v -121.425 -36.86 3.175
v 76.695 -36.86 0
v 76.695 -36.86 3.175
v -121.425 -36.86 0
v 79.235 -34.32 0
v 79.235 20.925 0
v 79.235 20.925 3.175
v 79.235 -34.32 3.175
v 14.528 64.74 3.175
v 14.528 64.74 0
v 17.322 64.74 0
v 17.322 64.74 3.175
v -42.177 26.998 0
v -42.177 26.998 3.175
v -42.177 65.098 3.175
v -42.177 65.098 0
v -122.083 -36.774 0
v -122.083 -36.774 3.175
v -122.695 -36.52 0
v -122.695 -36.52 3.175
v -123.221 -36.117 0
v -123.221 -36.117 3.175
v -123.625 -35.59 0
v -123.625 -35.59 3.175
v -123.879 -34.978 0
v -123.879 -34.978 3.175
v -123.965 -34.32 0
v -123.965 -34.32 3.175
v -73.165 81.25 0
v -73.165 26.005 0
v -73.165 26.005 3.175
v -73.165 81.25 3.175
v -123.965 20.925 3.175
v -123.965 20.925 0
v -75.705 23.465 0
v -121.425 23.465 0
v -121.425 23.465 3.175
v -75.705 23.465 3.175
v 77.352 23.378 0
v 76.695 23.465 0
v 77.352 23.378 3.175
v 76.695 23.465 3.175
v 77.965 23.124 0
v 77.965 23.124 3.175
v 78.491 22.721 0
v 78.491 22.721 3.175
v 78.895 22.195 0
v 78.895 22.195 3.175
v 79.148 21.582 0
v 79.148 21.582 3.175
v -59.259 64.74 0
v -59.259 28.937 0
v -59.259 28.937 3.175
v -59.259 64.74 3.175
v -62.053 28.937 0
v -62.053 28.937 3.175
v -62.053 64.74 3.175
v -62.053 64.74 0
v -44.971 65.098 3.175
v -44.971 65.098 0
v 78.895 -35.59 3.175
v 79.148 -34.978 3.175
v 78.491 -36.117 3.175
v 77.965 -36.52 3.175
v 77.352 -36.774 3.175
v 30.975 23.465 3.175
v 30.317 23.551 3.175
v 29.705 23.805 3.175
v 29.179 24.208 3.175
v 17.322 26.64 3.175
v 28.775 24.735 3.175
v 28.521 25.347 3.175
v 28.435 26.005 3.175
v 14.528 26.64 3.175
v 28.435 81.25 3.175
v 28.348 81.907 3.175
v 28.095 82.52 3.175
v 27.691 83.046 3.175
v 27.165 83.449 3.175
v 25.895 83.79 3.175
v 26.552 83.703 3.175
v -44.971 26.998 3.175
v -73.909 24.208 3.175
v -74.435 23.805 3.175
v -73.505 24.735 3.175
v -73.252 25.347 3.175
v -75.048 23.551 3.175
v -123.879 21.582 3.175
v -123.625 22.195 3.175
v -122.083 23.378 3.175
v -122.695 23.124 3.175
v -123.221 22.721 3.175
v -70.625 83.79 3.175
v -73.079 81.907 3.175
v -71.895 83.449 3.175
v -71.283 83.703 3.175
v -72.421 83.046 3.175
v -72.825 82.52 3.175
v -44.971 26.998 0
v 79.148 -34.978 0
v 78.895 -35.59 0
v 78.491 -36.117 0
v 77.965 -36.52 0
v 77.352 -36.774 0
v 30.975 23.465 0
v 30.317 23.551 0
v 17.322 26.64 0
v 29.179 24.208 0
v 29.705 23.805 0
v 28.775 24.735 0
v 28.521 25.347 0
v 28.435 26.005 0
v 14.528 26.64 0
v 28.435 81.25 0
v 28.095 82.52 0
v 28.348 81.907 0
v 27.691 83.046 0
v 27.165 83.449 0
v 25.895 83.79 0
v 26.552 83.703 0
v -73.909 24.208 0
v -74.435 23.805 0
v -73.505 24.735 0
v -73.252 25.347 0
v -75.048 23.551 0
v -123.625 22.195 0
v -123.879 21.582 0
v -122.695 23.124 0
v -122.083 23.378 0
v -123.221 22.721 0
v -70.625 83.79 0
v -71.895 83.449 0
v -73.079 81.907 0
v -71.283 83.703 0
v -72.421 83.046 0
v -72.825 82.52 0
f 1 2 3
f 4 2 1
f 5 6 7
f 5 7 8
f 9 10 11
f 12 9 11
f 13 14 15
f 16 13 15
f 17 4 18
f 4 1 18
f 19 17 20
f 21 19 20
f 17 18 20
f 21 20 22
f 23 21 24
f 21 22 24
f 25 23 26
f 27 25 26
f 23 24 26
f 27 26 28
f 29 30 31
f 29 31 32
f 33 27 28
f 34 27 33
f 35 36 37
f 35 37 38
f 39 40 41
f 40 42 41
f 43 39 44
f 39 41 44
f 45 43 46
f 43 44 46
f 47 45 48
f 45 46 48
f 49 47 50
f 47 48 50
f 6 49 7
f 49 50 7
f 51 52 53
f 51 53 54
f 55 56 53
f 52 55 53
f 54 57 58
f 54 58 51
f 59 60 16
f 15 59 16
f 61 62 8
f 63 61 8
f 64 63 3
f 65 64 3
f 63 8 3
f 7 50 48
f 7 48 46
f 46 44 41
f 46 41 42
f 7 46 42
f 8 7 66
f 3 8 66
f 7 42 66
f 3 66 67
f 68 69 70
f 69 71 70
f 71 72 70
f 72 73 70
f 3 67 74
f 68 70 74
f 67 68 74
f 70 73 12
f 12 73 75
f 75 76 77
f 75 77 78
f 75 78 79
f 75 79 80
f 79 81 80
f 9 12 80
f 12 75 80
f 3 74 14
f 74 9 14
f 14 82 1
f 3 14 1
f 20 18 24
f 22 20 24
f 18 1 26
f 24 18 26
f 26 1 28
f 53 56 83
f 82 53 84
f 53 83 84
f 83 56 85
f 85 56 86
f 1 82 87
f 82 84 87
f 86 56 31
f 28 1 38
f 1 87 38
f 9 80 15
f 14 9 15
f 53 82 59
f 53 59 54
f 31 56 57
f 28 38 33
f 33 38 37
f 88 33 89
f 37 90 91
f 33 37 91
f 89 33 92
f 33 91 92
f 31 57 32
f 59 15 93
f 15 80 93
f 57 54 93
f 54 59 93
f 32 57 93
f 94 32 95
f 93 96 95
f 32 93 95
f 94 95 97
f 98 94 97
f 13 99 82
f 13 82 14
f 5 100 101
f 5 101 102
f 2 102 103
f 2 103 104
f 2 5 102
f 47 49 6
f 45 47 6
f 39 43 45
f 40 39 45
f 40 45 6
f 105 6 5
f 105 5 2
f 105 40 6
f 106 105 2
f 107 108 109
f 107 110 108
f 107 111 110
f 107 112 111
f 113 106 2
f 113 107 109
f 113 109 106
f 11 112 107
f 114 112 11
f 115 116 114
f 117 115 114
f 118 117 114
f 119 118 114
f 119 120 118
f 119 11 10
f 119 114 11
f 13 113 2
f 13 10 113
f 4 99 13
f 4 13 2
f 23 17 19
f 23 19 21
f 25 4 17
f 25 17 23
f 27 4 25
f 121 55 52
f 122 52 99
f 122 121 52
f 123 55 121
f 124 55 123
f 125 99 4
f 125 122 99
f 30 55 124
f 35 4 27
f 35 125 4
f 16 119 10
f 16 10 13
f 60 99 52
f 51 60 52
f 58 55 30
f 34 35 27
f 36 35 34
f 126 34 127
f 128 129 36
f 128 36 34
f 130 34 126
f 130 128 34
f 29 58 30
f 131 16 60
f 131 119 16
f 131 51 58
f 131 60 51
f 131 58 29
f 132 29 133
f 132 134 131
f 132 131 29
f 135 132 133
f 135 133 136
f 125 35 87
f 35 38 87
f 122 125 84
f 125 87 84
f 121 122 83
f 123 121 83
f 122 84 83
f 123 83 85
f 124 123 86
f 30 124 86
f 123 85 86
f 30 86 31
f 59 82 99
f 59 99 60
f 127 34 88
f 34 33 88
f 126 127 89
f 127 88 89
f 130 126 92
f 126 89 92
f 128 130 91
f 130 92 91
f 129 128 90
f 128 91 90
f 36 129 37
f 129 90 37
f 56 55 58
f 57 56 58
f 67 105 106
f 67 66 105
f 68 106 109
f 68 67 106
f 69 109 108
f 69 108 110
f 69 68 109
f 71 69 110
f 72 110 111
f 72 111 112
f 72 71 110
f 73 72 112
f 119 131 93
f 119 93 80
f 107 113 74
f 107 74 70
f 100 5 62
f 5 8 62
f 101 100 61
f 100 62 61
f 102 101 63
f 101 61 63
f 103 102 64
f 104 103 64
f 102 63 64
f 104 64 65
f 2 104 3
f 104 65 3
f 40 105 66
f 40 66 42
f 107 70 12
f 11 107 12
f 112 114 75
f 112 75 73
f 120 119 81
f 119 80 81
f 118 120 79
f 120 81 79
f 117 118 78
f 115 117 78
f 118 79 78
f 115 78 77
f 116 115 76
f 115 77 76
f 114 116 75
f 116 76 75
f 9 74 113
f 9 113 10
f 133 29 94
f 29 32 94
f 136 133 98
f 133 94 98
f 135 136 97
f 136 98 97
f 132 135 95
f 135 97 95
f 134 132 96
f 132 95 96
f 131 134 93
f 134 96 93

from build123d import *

# Parameters (mm, degrees)
BOSS_EXTRUDE1_DEPTH    = 3.175
FILLET1_R              = 2.54
SKETCH2_W              = 2.794
SKETCH2_H              = 38.1
CUT_EXTRUDE1_DEPTH     = 3.175
CUT_EXTRUDE2_START     = -3.175
CUT_EXTRUDE2_OUTLINE_W = 2.794
CUT_EXTRUDE2_OUTLINE_H = 35.802572731
CUT_EXTRUDE2_DEPTH     = 3.175
SKETCH4_W              = 2.794
SKETCH4_H              = 38.1
CUT_EXTRUDE3_DEPTH     = 3.175


# Read off the part's stored shape, not the designer's step: Cut-Extrude2
with BuildPart() as part:
    # Sketch1 → Boss-Extrude1 (new body)
    with BuildSketch(Plane.XY):
        Polygon((28.434847271, 23.464502165), (79.234847271, 23.464502165), (79.234847271, -36.860497835), (-123.965152729, -36.860497835), (-123.965152729, 23.464502165), (-73.165152729, 23.464502165), (-73.165152729, 83.789502165), (28.434847271, 83.789502165), align=None)
    extrude(amount=BOSS_EXTRUDE1_DEPTH)

    # Fillet1
    fillet1_edges = [part.edges().sort_by_distance(p)[0] for p in [
        (-123.965152729, 23.464502165, 1.5875),
        (-73.165152729, 23.464502165, 1.5875),
        (-73.165152729, 83.789502165, 1.5875),
        (28.434847271, 83.789502165, 1.5875),
        (28.434847271, 23.464502165, 1.5875),
        (79.234847271, 23.464502165, 1.5875),
        (79.234847271, -36.860497835, 1.5875),
        (-123.965152729, -36.860497835, 1.5875),
    ]]
    fillet(fillet1_edges, radius=FILLET1_R)

    # Sketch2 → Cut-Extrude1 (cut)
    with BuildSketch(Plane.XY.offset(3.175)):
        with Locations((15.925347271, 45.689502165)):
            Rectangle(SKETCH2_W, SKETCH2_H)
    extrude(amount=-CUT_EXTRUDE1_DEPTH, mode=Mode.SUBTRACT)

    # Cut-Extrude2 outline → Cut-Extrude2 (cut)
    with BuildSketch(Plane.XY.offset(3.175).offset(CUT_EXTRUDE2_START)):
        with Locations((-60.655652729, 46.8382158)):
            Rectangle(CUT_EXTRUDE2_OUTLINE_W, CUT_EXTRUDE2_OUTLINE_H)
    extrude(amount=CUT_EXTRUDE2_DEPTH, mode=Mode.SUBTRACT)

    # Sketch4 → Cut-Extrude3 (cut)
    with BuildSketch(Plane.XY.offset(3.175)):
        with Locations((-43.574152729, 46.047516436)):
            Rectangle(SKETCH4_W, SKETCH4_H)
    extrude(amount=-CUT_EXTRUDE3_DEPTH, mode=Mode.SUBTRACT)


solid = part.part
